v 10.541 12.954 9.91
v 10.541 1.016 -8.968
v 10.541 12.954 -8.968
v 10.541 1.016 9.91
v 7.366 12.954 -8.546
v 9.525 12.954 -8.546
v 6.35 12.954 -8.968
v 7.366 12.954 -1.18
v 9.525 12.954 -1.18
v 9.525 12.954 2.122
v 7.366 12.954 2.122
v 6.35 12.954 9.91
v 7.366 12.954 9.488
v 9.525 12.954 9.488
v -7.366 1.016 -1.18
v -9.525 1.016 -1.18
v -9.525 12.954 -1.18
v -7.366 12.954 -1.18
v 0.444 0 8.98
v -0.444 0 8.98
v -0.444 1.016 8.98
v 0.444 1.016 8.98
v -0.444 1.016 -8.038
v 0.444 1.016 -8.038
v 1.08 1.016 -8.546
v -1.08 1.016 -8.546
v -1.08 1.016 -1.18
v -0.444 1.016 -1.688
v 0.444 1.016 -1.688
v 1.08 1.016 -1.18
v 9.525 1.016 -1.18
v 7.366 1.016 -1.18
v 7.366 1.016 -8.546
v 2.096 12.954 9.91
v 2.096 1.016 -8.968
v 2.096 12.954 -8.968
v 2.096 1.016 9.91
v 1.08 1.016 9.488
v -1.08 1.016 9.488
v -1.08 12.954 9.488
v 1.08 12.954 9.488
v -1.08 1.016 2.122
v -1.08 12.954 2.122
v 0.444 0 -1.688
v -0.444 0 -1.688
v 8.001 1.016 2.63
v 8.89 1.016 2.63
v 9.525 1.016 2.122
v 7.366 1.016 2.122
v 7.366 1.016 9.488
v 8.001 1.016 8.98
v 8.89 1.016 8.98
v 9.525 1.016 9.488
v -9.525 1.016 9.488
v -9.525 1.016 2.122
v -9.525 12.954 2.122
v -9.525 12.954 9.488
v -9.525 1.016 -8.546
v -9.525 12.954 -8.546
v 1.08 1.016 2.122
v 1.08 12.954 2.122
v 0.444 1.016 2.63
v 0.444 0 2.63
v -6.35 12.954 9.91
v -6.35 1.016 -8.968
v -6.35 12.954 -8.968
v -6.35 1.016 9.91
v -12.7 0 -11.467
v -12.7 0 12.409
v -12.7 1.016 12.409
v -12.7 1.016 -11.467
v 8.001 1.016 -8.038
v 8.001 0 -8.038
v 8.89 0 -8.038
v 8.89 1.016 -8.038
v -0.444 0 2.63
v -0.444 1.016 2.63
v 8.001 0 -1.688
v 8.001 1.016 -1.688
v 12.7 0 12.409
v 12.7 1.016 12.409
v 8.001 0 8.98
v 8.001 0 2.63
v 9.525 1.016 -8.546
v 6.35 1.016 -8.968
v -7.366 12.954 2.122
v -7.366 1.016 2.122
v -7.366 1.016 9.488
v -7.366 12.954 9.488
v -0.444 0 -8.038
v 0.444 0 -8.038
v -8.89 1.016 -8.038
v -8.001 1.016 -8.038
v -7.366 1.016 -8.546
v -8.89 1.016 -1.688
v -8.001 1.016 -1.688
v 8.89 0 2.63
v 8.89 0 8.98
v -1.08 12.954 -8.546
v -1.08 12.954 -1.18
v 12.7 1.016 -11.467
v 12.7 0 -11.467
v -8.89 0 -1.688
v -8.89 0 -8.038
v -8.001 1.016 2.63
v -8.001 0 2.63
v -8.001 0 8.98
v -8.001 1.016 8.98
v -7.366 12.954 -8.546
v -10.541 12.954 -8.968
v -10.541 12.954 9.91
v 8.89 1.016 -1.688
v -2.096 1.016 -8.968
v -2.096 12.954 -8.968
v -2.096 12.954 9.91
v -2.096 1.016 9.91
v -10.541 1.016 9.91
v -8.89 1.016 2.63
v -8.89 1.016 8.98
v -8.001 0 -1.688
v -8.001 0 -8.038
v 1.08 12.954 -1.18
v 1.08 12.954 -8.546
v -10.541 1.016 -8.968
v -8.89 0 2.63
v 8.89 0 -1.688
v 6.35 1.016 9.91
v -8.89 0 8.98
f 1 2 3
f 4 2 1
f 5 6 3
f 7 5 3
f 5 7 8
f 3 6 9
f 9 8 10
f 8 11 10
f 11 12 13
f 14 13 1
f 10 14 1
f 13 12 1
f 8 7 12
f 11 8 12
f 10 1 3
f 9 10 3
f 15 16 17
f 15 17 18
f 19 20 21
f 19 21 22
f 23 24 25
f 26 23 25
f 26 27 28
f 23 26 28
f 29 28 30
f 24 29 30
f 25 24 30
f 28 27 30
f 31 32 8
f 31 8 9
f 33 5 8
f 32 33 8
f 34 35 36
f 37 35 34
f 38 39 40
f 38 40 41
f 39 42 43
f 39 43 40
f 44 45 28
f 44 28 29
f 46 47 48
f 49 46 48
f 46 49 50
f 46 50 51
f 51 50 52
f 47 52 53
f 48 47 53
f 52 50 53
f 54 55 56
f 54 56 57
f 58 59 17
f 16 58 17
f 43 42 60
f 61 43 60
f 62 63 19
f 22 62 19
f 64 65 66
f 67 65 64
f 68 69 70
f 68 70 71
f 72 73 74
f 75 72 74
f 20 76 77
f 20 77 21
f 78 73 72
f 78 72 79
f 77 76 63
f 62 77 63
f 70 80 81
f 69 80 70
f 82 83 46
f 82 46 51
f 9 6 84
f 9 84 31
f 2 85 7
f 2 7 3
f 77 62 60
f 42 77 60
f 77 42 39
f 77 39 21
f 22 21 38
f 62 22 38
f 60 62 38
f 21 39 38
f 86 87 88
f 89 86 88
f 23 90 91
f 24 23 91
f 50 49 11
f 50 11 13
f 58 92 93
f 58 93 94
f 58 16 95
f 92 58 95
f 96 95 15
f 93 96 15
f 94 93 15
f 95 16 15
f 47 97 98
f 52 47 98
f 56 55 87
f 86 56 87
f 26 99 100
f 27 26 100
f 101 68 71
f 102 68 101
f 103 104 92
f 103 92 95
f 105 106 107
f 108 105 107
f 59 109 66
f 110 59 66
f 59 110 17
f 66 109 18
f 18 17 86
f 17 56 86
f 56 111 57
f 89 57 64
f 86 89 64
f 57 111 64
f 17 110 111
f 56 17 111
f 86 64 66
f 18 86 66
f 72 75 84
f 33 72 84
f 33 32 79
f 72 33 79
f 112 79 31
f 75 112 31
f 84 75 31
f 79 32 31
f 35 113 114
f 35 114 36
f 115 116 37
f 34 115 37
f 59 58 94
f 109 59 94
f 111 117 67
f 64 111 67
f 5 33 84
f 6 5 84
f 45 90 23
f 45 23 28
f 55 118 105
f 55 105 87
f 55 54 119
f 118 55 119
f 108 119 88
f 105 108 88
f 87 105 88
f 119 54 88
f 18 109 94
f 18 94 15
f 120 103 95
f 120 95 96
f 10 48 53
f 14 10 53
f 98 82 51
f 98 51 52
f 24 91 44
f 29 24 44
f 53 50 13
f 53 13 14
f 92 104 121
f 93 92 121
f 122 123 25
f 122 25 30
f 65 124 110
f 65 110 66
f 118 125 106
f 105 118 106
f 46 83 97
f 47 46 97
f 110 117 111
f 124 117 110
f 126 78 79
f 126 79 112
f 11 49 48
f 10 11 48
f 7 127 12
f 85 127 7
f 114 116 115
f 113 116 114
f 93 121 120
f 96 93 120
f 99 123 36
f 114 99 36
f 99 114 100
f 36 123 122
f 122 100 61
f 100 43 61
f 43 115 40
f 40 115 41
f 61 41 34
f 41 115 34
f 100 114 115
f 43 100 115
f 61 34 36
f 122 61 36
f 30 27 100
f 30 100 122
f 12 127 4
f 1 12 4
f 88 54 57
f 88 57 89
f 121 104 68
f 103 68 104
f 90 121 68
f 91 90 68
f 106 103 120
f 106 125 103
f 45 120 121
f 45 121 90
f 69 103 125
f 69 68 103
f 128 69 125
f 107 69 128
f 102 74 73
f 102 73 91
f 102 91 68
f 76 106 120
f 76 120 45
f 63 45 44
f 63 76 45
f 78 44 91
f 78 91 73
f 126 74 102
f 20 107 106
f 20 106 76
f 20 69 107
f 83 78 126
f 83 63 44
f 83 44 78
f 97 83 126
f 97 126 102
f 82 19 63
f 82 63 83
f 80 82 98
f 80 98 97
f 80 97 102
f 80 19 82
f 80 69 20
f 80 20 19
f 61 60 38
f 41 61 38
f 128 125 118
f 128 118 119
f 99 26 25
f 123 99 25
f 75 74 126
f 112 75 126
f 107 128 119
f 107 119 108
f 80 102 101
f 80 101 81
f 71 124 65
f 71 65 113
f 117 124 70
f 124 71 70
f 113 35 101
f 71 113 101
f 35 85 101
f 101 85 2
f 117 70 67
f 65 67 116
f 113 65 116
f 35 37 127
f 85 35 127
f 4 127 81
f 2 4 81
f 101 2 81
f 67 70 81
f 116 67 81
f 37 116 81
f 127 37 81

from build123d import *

# Parameters (mm, degrees)
F0_W     = 4.191
F0_H     = 9.4390108662
F0_W_2   = 2.159
F0_H_2   = 7.366
F0_W_3   = 0.889
F0_H_3   = 6.35
F1_DEPTH = 1.016
F2_DEPTH = 12.954


with BuildPart() as f1:
    # F0 (on Front) → F1 (new body)
    with BuildSketch(Plane.XZ):
        Polygon((-8.4455, 12.408932417), (-12.7, 12.408932417), (-12.7, -11.467067583), (12.7, -11.467067583), (12.7, 12.408932417), (0, 12.408932417), align=None)
        Polygon((-6.35, 9.9099432833), (-6.35, 0.470932417), (-6.35, -8.9680784492), (-10.541, -8.9680784492), (-10.541, 0.470932417), (-10.541, 9.9099432833), align=None, mode=Mode.SUBTRACT)
        Polygon((-2.0955, -8.9680784492), (-2.0955, 0.470932417), (-2.0955, 9.9099432833), (2.0955, 9.9099432833), (2.0955, 0.470932417), (2.0955, -8.9680784492), align=None, mode=Mode.SUBTRACT)
        Polygon((6.35, -8.9680784492), (6.35, 0.470932417), (6.35, 9.9099432833), (10.541, 9.9099432833), (10.541, 0.470932417), (10.541, -8.9680784492), align=None, mode=Mode.SUBTRACT)
        with Locations((-8.4455, 5.1904378501)):
            Rectangle(F0_W, F0_H)
        with Locations((-8.4455, 5.804932417)):
            Rectangle(F0_W_2, F0_H_2, mode=Mode.SUBTRACT)
        with Locations((-8.4455, 5.804932417)):
            Rectangle(F0_W_2, F0_H_2)
        with Locations((-8.4455, 5.804932417)):
            Rectangle(F0_W_3, F0_H_3, mode=Mode.SUBTRACT)
        with Locations((0, 5.1904378501)):
            Rectangle(F0_W, F0_H)
        with Locations((0, 5.804932417)):
            Rectangle(F0_W_2, F0_H_2, mode=Mode.SUBTRACT)
        with Locations((0, 5.804932417)):
            Rectangle(F0_W_2, F0_H_2)
        with Locations((0, 5.804932417)):
            Rectangle(F0_W_3, F0_H_3, mode=Mode.SUBTRACT)
        with Locations((0, -4.2485730161)):
            Rectangle(F0_W, F0_H)
        with Locations((0, -4.863067583)):
            Rectangle(F0_W_2, F0_H_2, mode=Mode.SUBTRACT)
        with Locations((0, -4.863067583)):
            Rectangle(F0_W_2, F0_H_2)
        with Locations((0, -4.863067583)):
            Rectangle(F0_W_3, F0_H_3, mode=Mode.SUBTRACT)
        with Locations((-8.4455, -4.2485730161)):
            Rectangle(F0_W, F0_H)
        with Locations((-8.4455, -4.863067583)):
            Rectangle(F0_W_2, F0_H_2, mode=Mode.SUBTRACT)
        with Locations((-8.4455, -4.863067583)):
            Rectangle(F0_W_2, F0_H_2)
        with Locations((-8.4455, -4.863067583)):
            Rectangle(F0_W_3, F0_H_3, mode=Mode.SUBTRACT)
        with Locations((8.4455, -4.2485730161)):
            Rectangle(F0_W, F0_H)
        with Locations((8.4455, -4.863067583)):
            Rectangle(F0_W_2, F0_H_2, mode=Mode.SUBTRACT)
        with Locations((8.4455, -4.863067583)):
            Rectangle(F0_W_2, F0_H_2)
        with Locations((8.4455, -4.863067583)):
            Rectangle(F0_W_3, F0_H_3, mode=Mode.SUBTRACT)
        with Locations((8.4455, 5.1904378501)):
            Rectangle(F0_W, F0_H)
        with Locations((8.4455, 5.804932417)):
            Rectangle(F0_W_2, F0_H_2, mode=Mode.SUBTRACT)
        with Locations((8.4455, 5.804932417)):
            Rectangle(F0_W_2, F0_H_2)
        with Locations((8.4455, 5.804932417)):
            Rectangle(F0_W_3, F0_H_3, mode=Mode.SUBTRACT)
    extrude(amount=-F1_DEPTH)

    # F0 (on Front) → F2 (join)
    with BuildSketch(Plane.XZ):
        with Locations((-8.4455, 5.1904378501)):
            Rectangle(F0_W, F0_H)
        with Locations((-8.4455, 5.804932417)):
            Rectangle(F0_W_2, F0_H_2, mode=Mode.SUBTRACT)
        with Locations((-8.4455, -4.2485730161)):
            Rectangle(F0_W, F0_H)
        with Locations((-8.4455, -4.863067583)):
            Rectangle(F0_W_2, F0_H_2, mode=Mode.SUBTRACT)
        with Locations((0, 5.1904378501)):
            Rectangle(F0_W, F0_H)
        with Locations((0, 5.804932417)):
            Rectangle(F0_W_2, F0_H_2, mode=Mode.SUBTRACT)
        with Locations((0, -4.2485730161)):
            Rectangle(F0_W, F0_H)
        with Locations((0, -4.863067583)):
            Rectangle(F0_W_2, F0_H_2, mode=Mode.SUBTRACT)
        with Locations((8.4455, 5.1904378501)):
            Rectangle(F0_W, F0_H)
        with Locations((8.4455, 5.804932417)):
            Rectangle(F0_W_2, F0_H_2, mode=Mode.SUBTRACT)
        with Locations((8.4455, -4.2485730161)):
            Rectangle(F0_W, F0_H)
        with Locations((8.4455, -4.863067583)):
            Rectangle(F0_W_2, F0_H_2, mode=Mode.SUBTRACT)
    extrude(amount=-F2_DEPTH)


solid = f1.part
